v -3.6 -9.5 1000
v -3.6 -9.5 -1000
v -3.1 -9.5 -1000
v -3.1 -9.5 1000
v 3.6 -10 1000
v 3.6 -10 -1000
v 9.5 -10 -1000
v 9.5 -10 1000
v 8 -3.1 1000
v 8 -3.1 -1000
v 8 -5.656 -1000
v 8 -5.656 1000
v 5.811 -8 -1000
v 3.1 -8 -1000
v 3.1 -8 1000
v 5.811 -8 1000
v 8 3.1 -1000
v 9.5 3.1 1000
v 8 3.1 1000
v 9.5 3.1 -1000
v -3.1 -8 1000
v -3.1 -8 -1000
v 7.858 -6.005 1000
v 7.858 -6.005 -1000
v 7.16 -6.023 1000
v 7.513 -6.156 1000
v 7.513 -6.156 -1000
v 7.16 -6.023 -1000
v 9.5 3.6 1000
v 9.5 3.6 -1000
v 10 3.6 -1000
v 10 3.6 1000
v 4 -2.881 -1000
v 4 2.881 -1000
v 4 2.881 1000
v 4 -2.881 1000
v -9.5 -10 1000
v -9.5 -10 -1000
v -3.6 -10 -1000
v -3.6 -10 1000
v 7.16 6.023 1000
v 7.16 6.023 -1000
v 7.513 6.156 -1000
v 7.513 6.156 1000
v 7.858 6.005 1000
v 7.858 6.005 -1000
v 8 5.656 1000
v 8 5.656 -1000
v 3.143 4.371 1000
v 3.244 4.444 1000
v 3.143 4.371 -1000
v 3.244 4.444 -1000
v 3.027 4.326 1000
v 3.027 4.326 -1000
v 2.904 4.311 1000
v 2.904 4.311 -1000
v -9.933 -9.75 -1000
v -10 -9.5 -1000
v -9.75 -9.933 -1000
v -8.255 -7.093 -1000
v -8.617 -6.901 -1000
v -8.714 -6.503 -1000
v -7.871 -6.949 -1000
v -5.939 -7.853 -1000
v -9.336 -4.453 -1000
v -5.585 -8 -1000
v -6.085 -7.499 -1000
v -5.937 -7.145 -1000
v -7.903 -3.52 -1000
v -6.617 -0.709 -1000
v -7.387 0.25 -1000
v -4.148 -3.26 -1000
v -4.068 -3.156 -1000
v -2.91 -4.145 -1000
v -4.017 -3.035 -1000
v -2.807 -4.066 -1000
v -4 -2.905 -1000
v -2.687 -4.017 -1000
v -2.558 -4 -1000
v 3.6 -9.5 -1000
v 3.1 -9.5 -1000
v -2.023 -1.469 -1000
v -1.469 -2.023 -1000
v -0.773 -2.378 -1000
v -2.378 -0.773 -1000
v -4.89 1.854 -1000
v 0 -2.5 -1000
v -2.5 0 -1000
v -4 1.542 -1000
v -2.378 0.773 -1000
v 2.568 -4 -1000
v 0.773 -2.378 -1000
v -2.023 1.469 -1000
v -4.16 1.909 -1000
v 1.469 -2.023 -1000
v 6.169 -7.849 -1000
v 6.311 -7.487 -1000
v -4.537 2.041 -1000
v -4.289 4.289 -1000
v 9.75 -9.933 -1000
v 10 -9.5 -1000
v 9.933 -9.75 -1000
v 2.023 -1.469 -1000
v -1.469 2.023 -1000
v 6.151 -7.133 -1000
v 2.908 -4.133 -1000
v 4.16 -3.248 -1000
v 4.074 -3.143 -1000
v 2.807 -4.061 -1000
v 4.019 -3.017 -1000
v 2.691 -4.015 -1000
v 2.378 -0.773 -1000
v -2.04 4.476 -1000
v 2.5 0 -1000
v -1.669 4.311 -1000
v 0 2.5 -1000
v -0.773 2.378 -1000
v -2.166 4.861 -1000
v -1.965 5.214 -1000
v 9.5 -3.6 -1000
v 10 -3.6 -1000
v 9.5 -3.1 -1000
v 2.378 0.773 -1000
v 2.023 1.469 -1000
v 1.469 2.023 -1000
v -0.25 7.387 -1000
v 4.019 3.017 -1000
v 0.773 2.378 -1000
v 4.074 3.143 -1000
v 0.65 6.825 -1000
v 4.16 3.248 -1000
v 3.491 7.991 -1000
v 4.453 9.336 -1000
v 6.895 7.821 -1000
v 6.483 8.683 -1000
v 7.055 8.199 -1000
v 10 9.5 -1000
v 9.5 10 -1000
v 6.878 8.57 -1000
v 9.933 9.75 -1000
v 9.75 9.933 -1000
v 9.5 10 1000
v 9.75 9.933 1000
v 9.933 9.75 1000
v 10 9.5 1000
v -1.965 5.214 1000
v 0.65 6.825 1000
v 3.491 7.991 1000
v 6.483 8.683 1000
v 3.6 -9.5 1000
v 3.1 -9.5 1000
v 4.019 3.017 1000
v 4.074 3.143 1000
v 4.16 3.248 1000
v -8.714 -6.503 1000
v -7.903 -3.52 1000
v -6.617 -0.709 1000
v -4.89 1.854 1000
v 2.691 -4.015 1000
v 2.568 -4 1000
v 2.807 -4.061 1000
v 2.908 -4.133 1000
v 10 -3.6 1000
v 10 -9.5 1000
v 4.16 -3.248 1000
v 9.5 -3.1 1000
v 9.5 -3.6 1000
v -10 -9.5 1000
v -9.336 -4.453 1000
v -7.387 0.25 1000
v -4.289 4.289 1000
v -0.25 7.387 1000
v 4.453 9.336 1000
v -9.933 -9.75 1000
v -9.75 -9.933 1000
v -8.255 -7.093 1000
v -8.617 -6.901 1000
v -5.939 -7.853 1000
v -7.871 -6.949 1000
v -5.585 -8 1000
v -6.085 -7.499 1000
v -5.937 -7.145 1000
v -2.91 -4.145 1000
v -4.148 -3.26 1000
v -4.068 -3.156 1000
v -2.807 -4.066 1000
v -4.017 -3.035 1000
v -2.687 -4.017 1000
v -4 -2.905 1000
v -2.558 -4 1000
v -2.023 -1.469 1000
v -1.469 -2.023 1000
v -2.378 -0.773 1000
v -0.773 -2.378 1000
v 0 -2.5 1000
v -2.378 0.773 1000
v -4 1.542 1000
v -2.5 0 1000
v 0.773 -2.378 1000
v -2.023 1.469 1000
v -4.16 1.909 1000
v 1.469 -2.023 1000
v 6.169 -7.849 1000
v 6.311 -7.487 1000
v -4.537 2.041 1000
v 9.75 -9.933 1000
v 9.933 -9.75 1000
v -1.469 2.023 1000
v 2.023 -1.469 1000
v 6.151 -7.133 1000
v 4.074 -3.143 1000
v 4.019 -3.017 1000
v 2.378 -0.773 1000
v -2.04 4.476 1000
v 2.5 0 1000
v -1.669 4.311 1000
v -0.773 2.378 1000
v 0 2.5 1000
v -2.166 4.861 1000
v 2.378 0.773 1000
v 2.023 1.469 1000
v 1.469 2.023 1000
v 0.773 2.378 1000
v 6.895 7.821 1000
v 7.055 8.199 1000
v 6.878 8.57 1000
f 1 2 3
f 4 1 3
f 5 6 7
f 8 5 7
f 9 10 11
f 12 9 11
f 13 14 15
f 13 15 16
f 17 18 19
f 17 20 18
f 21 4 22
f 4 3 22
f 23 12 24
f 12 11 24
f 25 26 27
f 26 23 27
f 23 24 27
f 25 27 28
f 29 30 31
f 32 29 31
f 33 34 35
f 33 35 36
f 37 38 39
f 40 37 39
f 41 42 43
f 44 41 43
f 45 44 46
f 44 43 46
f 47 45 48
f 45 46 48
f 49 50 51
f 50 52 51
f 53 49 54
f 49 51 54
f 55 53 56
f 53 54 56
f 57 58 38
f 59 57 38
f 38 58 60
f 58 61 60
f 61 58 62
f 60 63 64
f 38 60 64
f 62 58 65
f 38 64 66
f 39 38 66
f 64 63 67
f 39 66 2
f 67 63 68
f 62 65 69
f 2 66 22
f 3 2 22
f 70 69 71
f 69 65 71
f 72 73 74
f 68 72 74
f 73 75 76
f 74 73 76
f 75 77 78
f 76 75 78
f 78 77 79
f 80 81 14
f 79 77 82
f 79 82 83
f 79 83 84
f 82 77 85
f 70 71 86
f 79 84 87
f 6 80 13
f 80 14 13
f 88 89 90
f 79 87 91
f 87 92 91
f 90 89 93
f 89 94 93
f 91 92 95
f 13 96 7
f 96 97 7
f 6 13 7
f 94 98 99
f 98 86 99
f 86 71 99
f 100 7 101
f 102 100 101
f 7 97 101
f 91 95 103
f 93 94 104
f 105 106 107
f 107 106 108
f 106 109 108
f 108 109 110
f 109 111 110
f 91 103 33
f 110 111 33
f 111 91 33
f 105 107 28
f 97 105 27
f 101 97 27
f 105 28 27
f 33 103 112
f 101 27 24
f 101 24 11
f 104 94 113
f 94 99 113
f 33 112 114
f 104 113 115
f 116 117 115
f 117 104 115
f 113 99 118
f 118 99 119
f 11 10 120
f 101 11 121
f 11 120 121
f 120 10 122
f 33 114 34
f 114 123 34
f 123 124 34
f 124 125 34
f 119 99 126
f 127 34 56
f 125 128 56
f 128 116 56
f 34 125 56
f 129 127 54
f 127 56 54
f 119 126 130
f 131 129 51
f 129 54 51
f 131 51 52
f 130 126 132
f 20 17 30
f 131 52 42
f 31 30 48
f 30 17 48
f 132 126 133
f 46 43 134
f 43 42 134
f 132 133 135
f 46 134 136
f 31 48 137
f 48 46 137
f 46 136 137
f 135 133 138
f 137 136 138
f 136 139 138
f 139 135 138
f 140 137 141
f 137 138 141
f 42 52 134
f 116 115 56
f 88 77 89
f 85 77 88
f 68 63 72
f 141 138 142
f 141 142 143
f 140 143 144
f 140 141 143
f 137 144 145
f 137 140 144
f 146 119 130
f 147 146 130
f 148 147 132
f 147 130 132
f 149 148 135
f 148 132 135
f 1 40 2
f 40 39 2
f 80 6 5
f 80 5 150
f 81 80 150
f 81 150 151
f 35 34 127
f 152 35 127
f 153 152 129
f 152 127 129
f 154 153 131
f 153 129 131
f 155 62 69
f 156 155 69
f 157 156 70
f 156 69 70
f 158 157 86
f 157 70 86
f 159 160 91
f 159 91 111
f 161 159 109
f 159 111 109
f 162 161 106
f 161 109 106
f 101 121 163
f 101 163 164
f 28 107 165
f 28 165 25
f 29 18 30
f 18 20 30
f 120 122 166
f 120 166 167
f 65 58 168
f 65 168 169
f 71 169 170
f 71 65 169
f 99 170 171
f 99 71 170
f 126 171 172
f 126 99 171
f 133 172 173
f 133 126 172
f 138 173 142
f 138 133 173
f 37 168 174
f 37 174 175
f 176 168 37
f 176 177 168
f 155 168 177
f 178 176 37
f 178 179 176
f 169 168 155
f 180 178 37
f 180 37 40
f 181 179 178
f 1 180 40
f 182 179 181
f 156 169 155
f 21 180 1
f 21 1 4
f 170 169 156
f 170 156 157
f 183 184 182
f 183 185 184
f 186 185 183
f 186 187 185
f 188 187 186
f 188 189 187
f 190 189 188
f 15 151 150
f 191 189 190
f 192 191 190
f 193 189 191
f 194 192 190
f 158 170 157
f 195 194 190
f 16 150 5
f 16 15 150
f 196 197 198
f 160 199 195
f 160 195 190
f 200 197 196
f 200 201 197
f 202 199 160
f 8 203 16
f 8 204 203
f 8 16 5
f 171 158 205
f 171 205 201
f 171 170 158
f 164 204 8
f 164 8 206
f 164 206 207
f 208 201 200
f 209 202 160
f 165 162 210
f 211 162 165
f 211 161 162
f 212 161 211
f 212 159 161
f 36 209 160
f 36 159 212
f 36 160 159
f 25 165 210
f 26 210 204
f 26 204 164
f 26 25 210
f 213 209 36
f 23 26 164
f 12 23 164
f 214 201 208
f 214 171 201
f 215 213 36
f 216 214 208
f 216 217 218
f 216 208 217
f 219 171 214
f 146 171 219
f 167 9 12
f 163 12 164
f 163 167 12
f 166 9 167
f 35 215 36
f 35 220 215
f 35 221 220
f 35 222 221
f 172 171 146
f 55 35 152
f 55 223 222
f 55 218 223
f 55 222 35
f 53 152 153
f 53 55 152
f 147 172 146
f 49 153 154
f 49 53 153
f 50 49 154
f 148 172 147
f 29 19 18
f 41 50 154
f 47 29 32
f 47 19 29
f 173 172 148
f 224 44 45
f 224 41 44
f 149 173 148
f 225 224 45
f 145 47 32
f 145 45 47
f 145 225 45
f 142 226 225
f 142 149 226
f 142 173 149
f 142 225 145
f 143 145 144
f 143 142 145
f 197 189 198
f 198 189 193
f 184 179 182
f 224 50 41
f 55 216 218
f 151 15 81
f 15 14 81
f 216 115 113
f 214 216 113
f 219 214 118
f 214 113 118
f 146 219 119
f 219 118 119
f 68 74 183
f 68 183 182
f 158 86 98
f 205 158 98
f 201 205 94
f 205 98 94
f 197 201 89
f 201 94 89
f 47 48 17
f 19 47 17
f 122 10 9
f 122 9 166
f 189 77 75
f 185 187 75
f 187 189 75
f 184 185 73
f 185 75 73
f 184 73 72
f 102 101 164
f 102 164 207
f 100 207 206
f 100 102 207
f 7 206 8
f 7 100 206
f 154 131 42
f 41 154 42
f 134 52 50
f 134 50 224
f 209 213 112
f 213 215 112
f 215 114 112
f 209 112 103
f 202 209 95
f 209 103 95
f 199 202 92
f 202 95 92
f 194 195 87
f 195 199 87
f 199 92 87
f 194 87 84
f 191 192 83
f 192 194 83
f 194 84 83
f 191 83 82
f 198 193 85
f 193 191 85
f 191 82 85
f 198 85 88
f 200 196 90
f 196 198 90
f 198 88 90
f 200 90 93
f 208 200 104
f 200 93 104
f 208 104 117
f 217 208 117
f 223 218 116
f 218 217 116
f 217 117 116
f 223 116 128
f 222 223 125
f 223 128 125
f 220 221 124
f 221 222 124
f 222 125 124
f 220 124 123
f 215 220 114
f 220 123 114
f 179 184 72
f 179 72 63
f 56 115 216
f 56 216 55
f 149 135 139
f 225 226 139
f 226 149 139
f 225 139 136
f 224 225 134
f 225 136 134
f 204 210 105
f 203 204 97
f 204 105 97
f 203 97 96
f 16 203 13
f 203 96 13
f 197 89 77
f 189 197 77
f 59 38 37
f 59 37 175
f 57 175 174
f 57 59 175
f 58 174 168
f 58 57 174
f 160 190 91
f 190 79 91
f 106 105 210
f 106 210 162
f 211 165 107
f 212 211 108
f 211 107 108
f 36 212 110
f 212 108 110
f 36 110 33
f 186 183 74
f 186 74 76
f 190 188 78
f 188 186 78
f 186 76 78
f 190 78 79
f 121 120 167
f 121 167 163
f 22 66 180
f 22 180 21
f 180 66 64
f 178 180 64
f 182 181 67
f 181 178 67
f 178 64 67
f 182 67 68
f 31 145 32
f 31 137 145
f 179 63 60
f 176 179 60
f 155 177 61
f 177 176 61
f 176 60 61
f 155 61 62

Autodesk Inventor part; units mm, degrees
ref_plane "YZ Plane" through (0, 0, 0) normal (1, 0, 0) x (0, 1, 0)
ref_plane "XZ Plane" through (0, 0, 0) normal (0, 1, 0) x (-1, 0, 0)
ref_plane "XY Plane" through (0, 0, 0) normal (0, 0, 1) x (1, 0, 0)
sketch "Esboço2" plane through (0, 0, 0) normal (0, 0, 1) x (1, 0, 0)
  circle A0 centre (0, 0) radius 2.5
  line L0 (10, 10) -> (10, -10) construction
  line L1 (10, 3.1) -> (10, -3.1) construction
  line L2 (4, 3.1) -> (4, -3.1) construction
  line L3 (0, 0) -> (2.5, 0) construction
  line L4 (10, 10) -> (10, 3.1) construction
  line L5 (10, 3.1) -> (8, 3.1) construction
  line L6 (8, 3.1) -> (8, 6.8) construction
  line L7 (8, 6.8) -> (4, 3.1) construction
  line L8 (10, -3.1) -> (10, -10) construction
  line L9 (8, -3.1) -> (10, -3.1) construction
  line L10 (8, -3.1) -> (8, -6.8) construction
  line L11 (8, -6.8) -> (4, -3.1) construction
  line L12 (10, 3.1) -> (9.5, 3.1) construction
  line L13 (9.5, 3.1) -> (9.5, 3.6)
  line L14 (9.5, 3.6) -> (10, 3.6)
  line L15 (10, 3.6) -> (10, 3.1) construction
  line L16 (10, 10) -> (10, 3.6) construction
  line L17 (9.5, 3.1) -> (8, 3.1)
  line L18 (10, -3.1) -> (9.5, -3.1) construction
  line L19 (9.5, -3.1) -> (9.5, -3.6)
  line L20 (9.5, -3.6) -> (10, -3.6)
  line L21 (10, -3.6) -> (10, -3.1) construction
  line L22 (10, -3.6) -> (10, -10) construction
  line L23 (8, -3.1) -> (9.5, -3.1)
  line L24 (0, 0) -> (0, -2.5) construction
  line L25 (0, 2.5) -> (0, 0) construction
  arc A1 (10, 9.5) -> (9.5, 10) centre (9.5, 9.5) ccw
  line L26 (10, 9.5) -> (10, 3.6)
  line L27 (-10, 10) -> (10, 10) construction
  line L28 (-10, 10) -> (-10, -10) construction
  line L29 (0, 0) -> (-10, 10) construction
  line L30 (-2.5, 0) -> (0, 0) construction
  arc A2 (8, 5.6564) -> (7.1605, 6.0234) centre (7.5, 5.6564) ccw
  line L31 (8, 5.6564) -> (8, 3.1)
  arc A3 (7.1605, -6.0234) -> (8, -5.6564) centre (7.5, -5.6564) ccw
  arc A4 (4.1605, 3.2484) -> (4, 2.8814) centre (4.5, 2.8814) ccw
  arc A5 (4, -2.8814) -> (4.1605, -3.2484) centre (4.5, -2.8814) ccw
  line L32 (4, 2.8814) -> (4, -2.8814)
  line L33 (4.1605, -3.2484) -> (7.1605, -6.0234)
  line L34 (4.1605, 3.2484) -> (7.1605, 6.0234)
  line L35 (8, -3.1) -> (8, -5.6564)
  arc A6 (9.5, -10) -> (10, -9.5) centre (9.5, -9.5) ccw
  line L36 (10, -3.6) -> (10, -9.5)
  arc A7 (9.5, 10) -> (-10, -9.5) centre (9.5, -9.5) ccw
  arc A8 (-10, -9.5) -> (-9.5, -10) centre (-9.5, -9.5) ccw
  line L37 (-3.1, 4.3108) -> (3.1, 4.3108) construction
  line L38 (3.1, 4.3108) -> (8, 8.8433) construction
  arc A9 (6.8948, 7.821) -> (6.4827, 8.6828) centre (6.5553, 8.1881) ccw
  arc A10 (2.9042, 4.3108) -> (3.2437, 4.4438) centre (2.9042, 4.8108) ccw
  arc A11 (8, 8.8433) -> (-3.1, 4.3108) centre (9.2294, -10.0255) ccw construction
  arc A12 (-1.9647, 5.2138) -> (-1.6687, 4.3108) centre (-1.6687, 4.8108) ccw
  line L39 (-1.6687, 4.3108) -> (2.9042, 4.3108)
  arc A13 (6.4827, 8.6828) -> (-1.9647, 5.2138) centre (9.2294, -10.0255) ccw
  line L40 (3.2437, 4.4438) -> (6.8948, 7.821)
  line L41 (-6.8, -8) -> (-3.1, -8) construction
  line L42 (-10, -10) -> (10, -10) construction
  line L43 (-3.1, -10) -> (3.1, -10) construction
  line L44 (-10, -10) -> (-3.1, -10) construction
  line L45 (-9.5, -10) -> (-3.1, -10) construction
  line L46 (-3.1, -8) -> (-3.1, -10) construction
  line L47 (3.1, -10) -> (10, -10) construction
  line L48 (3.1, -8) -> (3.1, -10) construction
  line L49 (3.1, -8) -> (7.0883, -8) construction
  line L50 (3.1, -10) -> (9.5, -10) construction
  line L51 (2.764, -4) -> (7.0883, -8) construction
  line L52 (-2.764, -4) -> (2.764, -4) construction
  line L53 (-6.8, -8) -> (-2.764, -4) construction
  arc A14 (-5.9372, -7.1449) -> (-5.5852, -8) centre (-5.5852, -7.5) ccw
  arc A15 (-2.5582, -4) -> (-2.9101, -4.1449) centre (-2.5582, -4.5) ccw
  arc A16 (2.9077, -4.133) -> (2.5682, -4) centre (2.5682, -4.5) ccw
  arc A17 (5.8114, -8) -> (6.151, -7.133) centre (5.8114, -7.5) ccw
  line L54 (-3.1, -10) -> (-3.6, -10) construction
  line L55 (-3.6, -10) -> (-3.6, -9.5)
  line L56 (-3.6, -9.5) -> (-3.1, -9.5)
  line L57 (-3.1, -9.5) -> (-3.1, -10) construction
  line L58 (-9.5, -10) -> (-3.6, -10)
  line L59 (-3.1, -9.5) -> (-3.1, -8)
  line L60 (-2.9101, -4.1449) -> (-5.9372, -7.1449)
  line L61 (-2.5582, -4) -> (2.5682, -4)
  line L62 (6.151, -7.133) -> (2.9077, -4.133)
  line L63 (3.1, -8) -> (5.8114, -8)
  line L64 (-5.5852, -8) -> (-3.1, -8)
  line L65 (3.1, -10) -> (3.6, -10) construction
  line L66 (3.6, -10) -> (3.6, -9.5)
  line L67 (3.6, -9.5) -> (3.1, -9.5)
  line L68 (3.1, -9.5) -> (3.1, -10) construction
  line L69 (3.6, -10) -> (9.5, -10)
  line L70 (3.1, -8) -> (3.1, -9.5)
  line L71 (-8.9309, -8) -> (-4, -3.1131) construction
  line L72 (-4, -3.1131) -> (-4, 2.889) construction
  arc A18 (-4, 2.889) -> (-8.9309, -8) centre (9.8766, -9.9556) ccw construction
  arc A19 (-8.7144, -6.503) -> (-7.8708, -6.9494) centre (-8.2228, -6.5943) ccw
  arc A20 (-4, 1.5422) -> (-4.8905, 1.8545) centre (-4.5, 1.5422) ccw
  arc A21 (-4.148, -3.2598) -> (-4, -2.9047) centre (-4.5, -2.9047) ccw
  arc A22 (-4.8863, 1.8598) -> (-8.7144, -6.503) centre (9.8766, -9.9556) ccw
  line L73 (-4, 1.5422) -> (-4, -2.9047)
  line L74 (-4.148, -3.2598) -> (-7.8708, -6.9494)
  point P0 (10, 0)
  point P1 (10, 0)
  point P2 (4, 0)
  point P3 (0, 4.3108)
  point P4 (0, -10)
  point P5 (0, -10)
  point P6 (10, 6.8)
  point P7 (8, -4.3782)
  point P8 (0, -4)
  point P9 (-4.8905, 1.8545)
  dimension "d6" = 5
  dimension "d7" = 20
  dimension "d8" = 10
  dimension "d9" = 6.2
  dimension "d11" = 6
  dimension "d17" = 2
  dimension "d22" = 0.5
  dimension "d24" = 0.5
  dimension "d65" = 1.5
  dimension "d67" = 1.5
  dimension "d69" = 1.5
  dimension "d70" = 1.5
  dimension "d72" = 1.5
extrude "Extrusão1" add sketch "Esboço2" along normal mid plane 2000
properties part number "Perfil 20×20 R90 2 rasgos" material "Ouro"
